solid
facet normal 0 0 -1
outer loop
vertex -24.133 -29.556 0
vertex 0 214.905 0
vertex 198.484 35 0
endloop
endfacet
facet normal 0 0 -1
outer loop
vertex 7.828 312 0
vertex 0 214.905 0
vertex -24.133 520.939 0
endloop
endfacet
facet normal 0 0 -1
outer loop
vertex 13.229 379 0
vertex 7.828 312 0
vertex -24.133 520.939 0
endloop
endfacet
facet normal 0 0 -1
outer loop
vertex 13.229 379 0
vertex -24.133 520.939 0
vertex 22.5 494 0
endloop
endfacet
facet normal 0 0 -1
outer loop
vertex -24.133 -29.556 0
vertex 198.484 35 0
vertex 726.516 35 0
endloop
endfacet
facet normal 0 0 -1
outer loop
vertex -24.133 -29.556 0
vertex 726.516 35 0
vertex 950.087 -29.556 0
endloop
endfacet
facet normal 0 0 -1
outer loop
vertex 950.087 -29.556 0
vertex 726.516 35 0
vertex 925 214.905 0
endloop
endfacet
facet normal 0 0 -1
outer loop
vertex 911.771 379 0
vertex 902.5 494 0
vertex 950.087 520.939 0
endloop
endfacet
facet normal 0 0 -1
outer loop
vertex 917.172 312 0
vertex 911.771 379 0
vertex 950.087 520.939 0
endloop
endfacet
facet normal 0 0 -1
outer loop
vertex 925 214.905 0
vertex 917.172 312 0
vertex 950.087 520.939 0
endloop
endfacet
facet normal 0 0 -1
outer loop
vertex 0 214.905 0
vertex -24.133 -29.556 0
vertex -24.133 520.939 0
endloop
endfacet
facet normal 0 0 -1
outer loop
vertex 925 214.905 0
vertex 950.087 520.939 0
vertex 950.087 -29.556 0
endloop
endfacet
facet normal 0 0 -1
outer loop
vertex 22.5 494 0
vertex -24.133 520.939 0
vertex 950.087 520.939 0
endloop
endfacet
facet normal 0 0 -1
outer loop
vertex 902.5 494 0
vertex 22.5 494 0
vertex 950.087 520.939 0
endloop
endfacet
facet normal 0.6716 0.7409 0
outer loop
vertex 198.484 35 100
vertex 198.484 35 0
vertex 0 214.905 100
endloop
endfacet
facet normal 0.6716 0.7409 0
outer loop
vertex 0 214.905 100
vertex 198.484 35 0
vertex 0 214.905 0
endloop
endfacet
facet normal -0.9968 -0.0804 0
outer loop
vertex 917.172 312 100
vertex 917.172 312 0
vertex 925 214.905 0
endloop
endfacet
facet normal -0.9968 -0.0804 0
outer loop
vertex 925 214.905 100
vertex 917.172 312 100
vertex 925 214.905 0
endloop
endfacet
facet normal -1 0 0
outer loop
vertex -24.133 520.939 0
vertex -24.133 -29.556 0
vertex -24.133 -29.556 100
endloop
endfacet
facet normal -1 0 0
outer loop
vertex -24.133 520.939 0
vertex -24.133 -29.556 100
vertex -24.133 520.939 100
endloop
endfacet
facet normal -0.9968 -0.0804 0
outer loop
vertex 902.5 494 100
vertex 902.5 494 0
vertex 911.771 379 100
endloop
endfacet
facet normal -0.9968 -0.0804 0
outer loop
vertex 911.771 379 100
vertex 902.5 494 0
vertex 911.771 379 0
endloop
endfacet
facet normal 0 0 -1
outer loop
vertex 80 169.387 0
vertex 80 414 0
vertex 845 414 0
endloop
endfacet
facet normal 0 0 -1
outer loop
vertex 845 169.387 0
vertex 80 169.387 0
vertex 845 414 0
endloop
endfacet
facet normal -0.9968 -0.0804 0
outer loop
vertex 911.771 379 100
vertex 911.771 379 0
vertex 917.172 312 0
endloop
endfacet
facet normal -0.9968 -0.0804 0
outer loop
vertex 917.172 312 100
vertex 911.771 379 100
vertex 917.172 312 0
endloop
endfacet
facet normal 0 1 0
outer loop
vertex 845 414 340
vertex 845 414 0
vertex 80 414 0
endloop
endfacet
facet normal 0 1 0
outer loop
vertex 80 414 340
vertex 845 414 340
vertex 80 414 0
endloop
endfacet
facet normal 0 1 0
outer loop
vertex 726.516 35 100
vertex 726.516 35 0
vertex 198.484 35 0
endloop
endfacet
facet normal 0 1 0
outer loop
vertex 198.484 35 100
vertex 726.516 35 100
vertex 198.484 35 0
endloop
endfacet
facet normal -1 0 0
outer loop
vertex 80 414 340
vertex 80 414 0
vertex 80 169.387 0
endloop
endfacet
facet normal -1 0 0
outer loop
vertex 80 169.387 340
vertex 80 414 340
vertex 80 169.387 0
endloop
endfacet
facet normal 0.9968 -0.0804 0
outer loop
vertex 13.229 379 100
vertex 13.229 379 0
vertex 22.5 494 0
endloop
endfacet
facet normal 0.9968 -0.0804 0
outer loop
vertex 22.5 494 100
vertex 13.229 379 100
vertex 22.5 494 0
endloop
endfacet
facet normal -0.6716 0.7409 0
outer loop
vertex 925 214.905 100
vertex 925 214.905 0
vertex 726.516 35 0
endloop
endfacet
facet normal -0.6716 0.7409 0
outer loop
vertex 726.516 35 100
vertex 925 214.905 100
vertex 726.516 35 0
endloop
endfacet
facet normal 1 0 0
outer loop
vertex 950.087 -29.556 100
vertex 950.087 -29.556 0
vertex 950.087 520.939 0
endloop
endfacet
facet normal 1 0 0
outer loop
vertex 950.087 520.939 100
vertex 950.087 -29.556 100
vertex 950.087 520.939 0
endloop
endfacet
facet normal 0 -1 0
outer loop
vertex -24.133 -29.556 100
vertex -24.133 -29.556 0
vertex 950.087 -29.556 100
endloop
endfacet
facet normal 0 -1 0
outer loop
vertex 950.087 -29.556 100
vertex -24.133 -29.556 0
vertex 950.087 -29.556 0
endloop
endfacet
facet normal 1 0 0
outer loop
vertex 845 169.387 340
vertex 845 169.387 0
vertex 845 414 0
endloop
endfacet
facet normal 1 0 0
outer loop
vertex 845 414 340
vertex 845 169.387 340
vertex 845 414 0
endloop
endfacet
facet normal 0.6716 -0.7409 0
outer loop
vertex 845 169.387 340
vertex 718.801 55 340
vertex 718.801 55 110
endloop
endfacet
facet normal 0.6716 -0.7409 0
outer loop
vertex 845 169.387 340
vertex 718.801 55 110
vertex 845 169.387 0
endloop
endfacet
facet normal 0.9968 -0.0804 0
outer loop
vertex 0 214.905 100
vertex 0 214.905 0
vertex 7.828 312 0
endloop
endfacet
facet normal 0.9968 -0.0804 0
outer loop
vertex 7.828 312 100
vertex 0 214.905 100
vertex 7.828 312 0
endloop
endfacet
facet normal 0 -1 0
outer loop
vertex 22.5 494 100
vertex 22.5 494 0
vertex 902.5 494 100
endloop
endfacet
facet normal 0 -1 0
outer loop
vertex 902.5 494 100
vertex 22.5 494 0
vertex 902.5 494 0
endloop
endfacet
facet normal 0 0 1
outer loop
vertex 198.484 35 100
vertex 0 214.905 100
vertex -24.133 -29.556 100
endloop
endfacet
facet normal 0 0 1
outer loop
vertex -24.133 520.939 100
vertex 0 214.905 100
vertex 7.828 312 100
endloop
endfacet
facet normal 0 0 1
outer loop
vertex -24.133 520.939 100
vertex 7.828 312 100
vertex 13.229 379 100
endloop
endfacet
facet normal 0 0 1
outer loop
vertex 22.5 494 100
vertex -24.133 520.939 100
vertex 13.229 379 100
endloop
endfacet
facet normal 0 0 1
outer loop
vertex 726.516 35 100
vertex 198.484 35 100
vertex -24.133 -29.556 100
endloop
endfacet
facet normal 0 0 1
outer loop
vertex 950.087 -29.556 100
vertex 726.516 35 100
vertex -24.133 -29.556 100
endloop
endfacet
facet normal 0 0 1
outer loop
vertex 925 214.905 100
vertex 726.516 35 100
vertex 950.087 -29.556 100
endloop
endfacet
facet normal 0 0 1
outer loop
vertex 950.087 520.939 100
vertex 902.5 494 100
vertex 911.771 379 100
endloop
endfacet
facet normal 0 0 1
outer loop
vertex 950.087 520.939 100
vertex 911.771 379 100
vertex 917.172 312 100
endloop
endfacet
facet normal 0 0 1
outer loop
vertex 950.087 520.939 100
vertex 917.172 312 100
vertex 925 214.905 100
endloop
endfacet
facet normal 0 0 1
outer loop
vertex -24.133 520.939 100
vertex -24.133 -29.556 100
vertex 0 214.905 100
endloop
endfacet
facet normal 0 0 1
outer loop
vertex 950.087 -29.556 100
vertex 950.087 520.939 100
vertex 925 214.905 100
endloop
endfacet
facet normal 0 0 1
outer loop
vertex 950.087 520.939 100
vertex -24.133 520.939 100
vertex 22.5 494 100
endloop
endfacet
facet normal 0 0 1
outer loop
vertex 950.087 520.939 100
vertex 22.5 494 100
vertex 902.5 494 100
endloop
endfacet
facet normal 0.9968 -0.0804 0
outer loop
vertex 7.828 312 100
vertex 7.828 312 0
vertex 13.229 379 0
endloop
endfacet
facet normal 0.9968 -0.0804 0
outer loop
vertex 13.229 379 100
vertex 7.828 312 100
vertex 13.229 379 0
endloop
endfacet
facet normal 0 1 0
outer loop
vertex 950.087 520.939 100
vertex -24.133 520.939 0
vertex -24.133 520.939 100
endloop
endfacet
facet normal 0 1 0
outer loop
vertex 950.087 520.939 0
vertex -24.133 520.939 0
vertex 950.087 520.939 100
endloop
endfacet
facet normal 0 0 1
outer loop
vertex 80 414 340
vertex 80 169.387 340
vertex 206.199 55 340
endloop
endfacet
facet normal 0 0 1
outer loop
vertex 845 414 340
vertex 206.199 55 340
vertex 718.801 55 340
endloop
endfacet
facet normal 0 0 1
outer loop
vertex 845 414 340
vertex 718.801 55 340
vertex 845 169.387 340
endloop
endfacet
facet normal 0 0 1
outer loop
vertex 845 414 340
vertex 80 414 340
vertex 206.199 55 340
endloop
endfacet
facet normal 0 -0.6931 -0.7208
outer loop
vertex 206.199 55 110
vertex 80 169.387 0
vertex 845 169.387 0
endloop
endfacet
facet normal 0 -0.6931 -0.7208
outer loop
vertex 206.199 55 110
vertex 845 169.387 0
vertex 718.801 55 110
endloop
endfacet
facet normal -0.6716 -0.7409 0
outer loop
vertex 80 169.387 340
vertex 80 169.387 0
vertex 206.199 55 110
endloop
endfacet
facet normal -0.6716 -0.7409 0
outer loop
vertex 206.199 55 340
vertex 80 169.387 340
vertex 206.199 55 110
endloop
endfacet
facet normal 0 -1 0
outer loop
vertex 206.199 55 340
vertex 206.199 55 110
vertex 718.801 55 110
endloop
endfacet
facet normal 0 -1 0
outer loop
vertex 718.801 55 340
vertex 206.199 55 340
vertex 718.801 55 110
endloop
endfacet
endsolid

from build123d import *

# Parameters (mm, degrees)
F0_W     = 974.2202758789
F0_H     = 550.4953376949
F1_DEPTH = 100
F3_DEPTH = 340
F5_DEPTH = 950.088428093


with BuildPart() as f1:
    # F0 (on Top) → F1 (new body)
    with BuildSketch(Plane.XY):
        with Locations((462.9772901535, 245.6912044436)):
            Rectangle(F0_W, F0_H)
        Polygon((237.0983631819, 0), (0, 0), (0, 35), (0, 214.90548196), (0, 312), (0, 379), (0, 494), (22.5, 494), (462.5, 494), (902.5, 494), (925, 494), (925, 379), (925, 312), (925, 214.90548196), (925, 35), (925, 0), (687.9016368181, 0), (462.5, 0), align=None, mode=Mode.SUBTRACT)
        Polygon((0, 494), (0, 379), (13.2289472464, 379), (22.5, 494), align=None)
        Polygon((902.5, 494), (911.7710527536, 379), (925, 379), (925, 494), align=None)
        Polygon((925, 214.90548196), (726.5160203865, 35), (925, 35), align=None)
        Polygon((726.5160203865, 35), (687.9016368181, 0), (925, 0), (925, 35), align=None)
        Polygon((0, 35), (0, 0), (237.0983631819, 0), (198.4839796135, 35), align=None)
        Polygon((0, 214.90548196), (0, 35), (198.4839796135, 35), align=None)
        Polygon((0, 379), (0, 312), (7.8275512942, 312), (13.2289472464, 379), align=None)
        Polygon((0, 312), (0, 214.90548196), (7.8275512942, 312), align=None)
        Polygon((917.1724487058, 312), (925, 214.90548196), (925, 312), align=None)
        Polygon((911.7710527536, 379), (917.1724487058, 312), (925, 312), (925, 379), align=None)
        Polygon((462.5, 35), (462.5, 0), (687.9016368181, 0), (726.5160203865, 35), align=None)
        Polygon((198.4839796135, 35), (237.0983631819, 0), (462.5, 0), (462.5, 35), align=None)
    extrude(amount=F1_DEPTH)


with BuildPart() as f3:
    # F2 (on Top) → F3 (new body)
    with BuildSketch(Plane.XY):
        Polygon((845, 414), (80, 414), (80, 169.3866584137), (206.1991515171, 55), (718.8008484829, 55), (845, 169.3866584137), align=None)
    extrude(amount=F3_DEPTH)

    # F4 (on Right) → F5 (cut, through all)
    with BuildSketch(Plane.YZ):
        Polygon((55, 0), (169.3866584137, 0), (55, 110), align=None)
    extrude(amount=F5_DEPTH, mode=Mode.SUBTRACT)


solid = Compound([f1.part, f3.part])
